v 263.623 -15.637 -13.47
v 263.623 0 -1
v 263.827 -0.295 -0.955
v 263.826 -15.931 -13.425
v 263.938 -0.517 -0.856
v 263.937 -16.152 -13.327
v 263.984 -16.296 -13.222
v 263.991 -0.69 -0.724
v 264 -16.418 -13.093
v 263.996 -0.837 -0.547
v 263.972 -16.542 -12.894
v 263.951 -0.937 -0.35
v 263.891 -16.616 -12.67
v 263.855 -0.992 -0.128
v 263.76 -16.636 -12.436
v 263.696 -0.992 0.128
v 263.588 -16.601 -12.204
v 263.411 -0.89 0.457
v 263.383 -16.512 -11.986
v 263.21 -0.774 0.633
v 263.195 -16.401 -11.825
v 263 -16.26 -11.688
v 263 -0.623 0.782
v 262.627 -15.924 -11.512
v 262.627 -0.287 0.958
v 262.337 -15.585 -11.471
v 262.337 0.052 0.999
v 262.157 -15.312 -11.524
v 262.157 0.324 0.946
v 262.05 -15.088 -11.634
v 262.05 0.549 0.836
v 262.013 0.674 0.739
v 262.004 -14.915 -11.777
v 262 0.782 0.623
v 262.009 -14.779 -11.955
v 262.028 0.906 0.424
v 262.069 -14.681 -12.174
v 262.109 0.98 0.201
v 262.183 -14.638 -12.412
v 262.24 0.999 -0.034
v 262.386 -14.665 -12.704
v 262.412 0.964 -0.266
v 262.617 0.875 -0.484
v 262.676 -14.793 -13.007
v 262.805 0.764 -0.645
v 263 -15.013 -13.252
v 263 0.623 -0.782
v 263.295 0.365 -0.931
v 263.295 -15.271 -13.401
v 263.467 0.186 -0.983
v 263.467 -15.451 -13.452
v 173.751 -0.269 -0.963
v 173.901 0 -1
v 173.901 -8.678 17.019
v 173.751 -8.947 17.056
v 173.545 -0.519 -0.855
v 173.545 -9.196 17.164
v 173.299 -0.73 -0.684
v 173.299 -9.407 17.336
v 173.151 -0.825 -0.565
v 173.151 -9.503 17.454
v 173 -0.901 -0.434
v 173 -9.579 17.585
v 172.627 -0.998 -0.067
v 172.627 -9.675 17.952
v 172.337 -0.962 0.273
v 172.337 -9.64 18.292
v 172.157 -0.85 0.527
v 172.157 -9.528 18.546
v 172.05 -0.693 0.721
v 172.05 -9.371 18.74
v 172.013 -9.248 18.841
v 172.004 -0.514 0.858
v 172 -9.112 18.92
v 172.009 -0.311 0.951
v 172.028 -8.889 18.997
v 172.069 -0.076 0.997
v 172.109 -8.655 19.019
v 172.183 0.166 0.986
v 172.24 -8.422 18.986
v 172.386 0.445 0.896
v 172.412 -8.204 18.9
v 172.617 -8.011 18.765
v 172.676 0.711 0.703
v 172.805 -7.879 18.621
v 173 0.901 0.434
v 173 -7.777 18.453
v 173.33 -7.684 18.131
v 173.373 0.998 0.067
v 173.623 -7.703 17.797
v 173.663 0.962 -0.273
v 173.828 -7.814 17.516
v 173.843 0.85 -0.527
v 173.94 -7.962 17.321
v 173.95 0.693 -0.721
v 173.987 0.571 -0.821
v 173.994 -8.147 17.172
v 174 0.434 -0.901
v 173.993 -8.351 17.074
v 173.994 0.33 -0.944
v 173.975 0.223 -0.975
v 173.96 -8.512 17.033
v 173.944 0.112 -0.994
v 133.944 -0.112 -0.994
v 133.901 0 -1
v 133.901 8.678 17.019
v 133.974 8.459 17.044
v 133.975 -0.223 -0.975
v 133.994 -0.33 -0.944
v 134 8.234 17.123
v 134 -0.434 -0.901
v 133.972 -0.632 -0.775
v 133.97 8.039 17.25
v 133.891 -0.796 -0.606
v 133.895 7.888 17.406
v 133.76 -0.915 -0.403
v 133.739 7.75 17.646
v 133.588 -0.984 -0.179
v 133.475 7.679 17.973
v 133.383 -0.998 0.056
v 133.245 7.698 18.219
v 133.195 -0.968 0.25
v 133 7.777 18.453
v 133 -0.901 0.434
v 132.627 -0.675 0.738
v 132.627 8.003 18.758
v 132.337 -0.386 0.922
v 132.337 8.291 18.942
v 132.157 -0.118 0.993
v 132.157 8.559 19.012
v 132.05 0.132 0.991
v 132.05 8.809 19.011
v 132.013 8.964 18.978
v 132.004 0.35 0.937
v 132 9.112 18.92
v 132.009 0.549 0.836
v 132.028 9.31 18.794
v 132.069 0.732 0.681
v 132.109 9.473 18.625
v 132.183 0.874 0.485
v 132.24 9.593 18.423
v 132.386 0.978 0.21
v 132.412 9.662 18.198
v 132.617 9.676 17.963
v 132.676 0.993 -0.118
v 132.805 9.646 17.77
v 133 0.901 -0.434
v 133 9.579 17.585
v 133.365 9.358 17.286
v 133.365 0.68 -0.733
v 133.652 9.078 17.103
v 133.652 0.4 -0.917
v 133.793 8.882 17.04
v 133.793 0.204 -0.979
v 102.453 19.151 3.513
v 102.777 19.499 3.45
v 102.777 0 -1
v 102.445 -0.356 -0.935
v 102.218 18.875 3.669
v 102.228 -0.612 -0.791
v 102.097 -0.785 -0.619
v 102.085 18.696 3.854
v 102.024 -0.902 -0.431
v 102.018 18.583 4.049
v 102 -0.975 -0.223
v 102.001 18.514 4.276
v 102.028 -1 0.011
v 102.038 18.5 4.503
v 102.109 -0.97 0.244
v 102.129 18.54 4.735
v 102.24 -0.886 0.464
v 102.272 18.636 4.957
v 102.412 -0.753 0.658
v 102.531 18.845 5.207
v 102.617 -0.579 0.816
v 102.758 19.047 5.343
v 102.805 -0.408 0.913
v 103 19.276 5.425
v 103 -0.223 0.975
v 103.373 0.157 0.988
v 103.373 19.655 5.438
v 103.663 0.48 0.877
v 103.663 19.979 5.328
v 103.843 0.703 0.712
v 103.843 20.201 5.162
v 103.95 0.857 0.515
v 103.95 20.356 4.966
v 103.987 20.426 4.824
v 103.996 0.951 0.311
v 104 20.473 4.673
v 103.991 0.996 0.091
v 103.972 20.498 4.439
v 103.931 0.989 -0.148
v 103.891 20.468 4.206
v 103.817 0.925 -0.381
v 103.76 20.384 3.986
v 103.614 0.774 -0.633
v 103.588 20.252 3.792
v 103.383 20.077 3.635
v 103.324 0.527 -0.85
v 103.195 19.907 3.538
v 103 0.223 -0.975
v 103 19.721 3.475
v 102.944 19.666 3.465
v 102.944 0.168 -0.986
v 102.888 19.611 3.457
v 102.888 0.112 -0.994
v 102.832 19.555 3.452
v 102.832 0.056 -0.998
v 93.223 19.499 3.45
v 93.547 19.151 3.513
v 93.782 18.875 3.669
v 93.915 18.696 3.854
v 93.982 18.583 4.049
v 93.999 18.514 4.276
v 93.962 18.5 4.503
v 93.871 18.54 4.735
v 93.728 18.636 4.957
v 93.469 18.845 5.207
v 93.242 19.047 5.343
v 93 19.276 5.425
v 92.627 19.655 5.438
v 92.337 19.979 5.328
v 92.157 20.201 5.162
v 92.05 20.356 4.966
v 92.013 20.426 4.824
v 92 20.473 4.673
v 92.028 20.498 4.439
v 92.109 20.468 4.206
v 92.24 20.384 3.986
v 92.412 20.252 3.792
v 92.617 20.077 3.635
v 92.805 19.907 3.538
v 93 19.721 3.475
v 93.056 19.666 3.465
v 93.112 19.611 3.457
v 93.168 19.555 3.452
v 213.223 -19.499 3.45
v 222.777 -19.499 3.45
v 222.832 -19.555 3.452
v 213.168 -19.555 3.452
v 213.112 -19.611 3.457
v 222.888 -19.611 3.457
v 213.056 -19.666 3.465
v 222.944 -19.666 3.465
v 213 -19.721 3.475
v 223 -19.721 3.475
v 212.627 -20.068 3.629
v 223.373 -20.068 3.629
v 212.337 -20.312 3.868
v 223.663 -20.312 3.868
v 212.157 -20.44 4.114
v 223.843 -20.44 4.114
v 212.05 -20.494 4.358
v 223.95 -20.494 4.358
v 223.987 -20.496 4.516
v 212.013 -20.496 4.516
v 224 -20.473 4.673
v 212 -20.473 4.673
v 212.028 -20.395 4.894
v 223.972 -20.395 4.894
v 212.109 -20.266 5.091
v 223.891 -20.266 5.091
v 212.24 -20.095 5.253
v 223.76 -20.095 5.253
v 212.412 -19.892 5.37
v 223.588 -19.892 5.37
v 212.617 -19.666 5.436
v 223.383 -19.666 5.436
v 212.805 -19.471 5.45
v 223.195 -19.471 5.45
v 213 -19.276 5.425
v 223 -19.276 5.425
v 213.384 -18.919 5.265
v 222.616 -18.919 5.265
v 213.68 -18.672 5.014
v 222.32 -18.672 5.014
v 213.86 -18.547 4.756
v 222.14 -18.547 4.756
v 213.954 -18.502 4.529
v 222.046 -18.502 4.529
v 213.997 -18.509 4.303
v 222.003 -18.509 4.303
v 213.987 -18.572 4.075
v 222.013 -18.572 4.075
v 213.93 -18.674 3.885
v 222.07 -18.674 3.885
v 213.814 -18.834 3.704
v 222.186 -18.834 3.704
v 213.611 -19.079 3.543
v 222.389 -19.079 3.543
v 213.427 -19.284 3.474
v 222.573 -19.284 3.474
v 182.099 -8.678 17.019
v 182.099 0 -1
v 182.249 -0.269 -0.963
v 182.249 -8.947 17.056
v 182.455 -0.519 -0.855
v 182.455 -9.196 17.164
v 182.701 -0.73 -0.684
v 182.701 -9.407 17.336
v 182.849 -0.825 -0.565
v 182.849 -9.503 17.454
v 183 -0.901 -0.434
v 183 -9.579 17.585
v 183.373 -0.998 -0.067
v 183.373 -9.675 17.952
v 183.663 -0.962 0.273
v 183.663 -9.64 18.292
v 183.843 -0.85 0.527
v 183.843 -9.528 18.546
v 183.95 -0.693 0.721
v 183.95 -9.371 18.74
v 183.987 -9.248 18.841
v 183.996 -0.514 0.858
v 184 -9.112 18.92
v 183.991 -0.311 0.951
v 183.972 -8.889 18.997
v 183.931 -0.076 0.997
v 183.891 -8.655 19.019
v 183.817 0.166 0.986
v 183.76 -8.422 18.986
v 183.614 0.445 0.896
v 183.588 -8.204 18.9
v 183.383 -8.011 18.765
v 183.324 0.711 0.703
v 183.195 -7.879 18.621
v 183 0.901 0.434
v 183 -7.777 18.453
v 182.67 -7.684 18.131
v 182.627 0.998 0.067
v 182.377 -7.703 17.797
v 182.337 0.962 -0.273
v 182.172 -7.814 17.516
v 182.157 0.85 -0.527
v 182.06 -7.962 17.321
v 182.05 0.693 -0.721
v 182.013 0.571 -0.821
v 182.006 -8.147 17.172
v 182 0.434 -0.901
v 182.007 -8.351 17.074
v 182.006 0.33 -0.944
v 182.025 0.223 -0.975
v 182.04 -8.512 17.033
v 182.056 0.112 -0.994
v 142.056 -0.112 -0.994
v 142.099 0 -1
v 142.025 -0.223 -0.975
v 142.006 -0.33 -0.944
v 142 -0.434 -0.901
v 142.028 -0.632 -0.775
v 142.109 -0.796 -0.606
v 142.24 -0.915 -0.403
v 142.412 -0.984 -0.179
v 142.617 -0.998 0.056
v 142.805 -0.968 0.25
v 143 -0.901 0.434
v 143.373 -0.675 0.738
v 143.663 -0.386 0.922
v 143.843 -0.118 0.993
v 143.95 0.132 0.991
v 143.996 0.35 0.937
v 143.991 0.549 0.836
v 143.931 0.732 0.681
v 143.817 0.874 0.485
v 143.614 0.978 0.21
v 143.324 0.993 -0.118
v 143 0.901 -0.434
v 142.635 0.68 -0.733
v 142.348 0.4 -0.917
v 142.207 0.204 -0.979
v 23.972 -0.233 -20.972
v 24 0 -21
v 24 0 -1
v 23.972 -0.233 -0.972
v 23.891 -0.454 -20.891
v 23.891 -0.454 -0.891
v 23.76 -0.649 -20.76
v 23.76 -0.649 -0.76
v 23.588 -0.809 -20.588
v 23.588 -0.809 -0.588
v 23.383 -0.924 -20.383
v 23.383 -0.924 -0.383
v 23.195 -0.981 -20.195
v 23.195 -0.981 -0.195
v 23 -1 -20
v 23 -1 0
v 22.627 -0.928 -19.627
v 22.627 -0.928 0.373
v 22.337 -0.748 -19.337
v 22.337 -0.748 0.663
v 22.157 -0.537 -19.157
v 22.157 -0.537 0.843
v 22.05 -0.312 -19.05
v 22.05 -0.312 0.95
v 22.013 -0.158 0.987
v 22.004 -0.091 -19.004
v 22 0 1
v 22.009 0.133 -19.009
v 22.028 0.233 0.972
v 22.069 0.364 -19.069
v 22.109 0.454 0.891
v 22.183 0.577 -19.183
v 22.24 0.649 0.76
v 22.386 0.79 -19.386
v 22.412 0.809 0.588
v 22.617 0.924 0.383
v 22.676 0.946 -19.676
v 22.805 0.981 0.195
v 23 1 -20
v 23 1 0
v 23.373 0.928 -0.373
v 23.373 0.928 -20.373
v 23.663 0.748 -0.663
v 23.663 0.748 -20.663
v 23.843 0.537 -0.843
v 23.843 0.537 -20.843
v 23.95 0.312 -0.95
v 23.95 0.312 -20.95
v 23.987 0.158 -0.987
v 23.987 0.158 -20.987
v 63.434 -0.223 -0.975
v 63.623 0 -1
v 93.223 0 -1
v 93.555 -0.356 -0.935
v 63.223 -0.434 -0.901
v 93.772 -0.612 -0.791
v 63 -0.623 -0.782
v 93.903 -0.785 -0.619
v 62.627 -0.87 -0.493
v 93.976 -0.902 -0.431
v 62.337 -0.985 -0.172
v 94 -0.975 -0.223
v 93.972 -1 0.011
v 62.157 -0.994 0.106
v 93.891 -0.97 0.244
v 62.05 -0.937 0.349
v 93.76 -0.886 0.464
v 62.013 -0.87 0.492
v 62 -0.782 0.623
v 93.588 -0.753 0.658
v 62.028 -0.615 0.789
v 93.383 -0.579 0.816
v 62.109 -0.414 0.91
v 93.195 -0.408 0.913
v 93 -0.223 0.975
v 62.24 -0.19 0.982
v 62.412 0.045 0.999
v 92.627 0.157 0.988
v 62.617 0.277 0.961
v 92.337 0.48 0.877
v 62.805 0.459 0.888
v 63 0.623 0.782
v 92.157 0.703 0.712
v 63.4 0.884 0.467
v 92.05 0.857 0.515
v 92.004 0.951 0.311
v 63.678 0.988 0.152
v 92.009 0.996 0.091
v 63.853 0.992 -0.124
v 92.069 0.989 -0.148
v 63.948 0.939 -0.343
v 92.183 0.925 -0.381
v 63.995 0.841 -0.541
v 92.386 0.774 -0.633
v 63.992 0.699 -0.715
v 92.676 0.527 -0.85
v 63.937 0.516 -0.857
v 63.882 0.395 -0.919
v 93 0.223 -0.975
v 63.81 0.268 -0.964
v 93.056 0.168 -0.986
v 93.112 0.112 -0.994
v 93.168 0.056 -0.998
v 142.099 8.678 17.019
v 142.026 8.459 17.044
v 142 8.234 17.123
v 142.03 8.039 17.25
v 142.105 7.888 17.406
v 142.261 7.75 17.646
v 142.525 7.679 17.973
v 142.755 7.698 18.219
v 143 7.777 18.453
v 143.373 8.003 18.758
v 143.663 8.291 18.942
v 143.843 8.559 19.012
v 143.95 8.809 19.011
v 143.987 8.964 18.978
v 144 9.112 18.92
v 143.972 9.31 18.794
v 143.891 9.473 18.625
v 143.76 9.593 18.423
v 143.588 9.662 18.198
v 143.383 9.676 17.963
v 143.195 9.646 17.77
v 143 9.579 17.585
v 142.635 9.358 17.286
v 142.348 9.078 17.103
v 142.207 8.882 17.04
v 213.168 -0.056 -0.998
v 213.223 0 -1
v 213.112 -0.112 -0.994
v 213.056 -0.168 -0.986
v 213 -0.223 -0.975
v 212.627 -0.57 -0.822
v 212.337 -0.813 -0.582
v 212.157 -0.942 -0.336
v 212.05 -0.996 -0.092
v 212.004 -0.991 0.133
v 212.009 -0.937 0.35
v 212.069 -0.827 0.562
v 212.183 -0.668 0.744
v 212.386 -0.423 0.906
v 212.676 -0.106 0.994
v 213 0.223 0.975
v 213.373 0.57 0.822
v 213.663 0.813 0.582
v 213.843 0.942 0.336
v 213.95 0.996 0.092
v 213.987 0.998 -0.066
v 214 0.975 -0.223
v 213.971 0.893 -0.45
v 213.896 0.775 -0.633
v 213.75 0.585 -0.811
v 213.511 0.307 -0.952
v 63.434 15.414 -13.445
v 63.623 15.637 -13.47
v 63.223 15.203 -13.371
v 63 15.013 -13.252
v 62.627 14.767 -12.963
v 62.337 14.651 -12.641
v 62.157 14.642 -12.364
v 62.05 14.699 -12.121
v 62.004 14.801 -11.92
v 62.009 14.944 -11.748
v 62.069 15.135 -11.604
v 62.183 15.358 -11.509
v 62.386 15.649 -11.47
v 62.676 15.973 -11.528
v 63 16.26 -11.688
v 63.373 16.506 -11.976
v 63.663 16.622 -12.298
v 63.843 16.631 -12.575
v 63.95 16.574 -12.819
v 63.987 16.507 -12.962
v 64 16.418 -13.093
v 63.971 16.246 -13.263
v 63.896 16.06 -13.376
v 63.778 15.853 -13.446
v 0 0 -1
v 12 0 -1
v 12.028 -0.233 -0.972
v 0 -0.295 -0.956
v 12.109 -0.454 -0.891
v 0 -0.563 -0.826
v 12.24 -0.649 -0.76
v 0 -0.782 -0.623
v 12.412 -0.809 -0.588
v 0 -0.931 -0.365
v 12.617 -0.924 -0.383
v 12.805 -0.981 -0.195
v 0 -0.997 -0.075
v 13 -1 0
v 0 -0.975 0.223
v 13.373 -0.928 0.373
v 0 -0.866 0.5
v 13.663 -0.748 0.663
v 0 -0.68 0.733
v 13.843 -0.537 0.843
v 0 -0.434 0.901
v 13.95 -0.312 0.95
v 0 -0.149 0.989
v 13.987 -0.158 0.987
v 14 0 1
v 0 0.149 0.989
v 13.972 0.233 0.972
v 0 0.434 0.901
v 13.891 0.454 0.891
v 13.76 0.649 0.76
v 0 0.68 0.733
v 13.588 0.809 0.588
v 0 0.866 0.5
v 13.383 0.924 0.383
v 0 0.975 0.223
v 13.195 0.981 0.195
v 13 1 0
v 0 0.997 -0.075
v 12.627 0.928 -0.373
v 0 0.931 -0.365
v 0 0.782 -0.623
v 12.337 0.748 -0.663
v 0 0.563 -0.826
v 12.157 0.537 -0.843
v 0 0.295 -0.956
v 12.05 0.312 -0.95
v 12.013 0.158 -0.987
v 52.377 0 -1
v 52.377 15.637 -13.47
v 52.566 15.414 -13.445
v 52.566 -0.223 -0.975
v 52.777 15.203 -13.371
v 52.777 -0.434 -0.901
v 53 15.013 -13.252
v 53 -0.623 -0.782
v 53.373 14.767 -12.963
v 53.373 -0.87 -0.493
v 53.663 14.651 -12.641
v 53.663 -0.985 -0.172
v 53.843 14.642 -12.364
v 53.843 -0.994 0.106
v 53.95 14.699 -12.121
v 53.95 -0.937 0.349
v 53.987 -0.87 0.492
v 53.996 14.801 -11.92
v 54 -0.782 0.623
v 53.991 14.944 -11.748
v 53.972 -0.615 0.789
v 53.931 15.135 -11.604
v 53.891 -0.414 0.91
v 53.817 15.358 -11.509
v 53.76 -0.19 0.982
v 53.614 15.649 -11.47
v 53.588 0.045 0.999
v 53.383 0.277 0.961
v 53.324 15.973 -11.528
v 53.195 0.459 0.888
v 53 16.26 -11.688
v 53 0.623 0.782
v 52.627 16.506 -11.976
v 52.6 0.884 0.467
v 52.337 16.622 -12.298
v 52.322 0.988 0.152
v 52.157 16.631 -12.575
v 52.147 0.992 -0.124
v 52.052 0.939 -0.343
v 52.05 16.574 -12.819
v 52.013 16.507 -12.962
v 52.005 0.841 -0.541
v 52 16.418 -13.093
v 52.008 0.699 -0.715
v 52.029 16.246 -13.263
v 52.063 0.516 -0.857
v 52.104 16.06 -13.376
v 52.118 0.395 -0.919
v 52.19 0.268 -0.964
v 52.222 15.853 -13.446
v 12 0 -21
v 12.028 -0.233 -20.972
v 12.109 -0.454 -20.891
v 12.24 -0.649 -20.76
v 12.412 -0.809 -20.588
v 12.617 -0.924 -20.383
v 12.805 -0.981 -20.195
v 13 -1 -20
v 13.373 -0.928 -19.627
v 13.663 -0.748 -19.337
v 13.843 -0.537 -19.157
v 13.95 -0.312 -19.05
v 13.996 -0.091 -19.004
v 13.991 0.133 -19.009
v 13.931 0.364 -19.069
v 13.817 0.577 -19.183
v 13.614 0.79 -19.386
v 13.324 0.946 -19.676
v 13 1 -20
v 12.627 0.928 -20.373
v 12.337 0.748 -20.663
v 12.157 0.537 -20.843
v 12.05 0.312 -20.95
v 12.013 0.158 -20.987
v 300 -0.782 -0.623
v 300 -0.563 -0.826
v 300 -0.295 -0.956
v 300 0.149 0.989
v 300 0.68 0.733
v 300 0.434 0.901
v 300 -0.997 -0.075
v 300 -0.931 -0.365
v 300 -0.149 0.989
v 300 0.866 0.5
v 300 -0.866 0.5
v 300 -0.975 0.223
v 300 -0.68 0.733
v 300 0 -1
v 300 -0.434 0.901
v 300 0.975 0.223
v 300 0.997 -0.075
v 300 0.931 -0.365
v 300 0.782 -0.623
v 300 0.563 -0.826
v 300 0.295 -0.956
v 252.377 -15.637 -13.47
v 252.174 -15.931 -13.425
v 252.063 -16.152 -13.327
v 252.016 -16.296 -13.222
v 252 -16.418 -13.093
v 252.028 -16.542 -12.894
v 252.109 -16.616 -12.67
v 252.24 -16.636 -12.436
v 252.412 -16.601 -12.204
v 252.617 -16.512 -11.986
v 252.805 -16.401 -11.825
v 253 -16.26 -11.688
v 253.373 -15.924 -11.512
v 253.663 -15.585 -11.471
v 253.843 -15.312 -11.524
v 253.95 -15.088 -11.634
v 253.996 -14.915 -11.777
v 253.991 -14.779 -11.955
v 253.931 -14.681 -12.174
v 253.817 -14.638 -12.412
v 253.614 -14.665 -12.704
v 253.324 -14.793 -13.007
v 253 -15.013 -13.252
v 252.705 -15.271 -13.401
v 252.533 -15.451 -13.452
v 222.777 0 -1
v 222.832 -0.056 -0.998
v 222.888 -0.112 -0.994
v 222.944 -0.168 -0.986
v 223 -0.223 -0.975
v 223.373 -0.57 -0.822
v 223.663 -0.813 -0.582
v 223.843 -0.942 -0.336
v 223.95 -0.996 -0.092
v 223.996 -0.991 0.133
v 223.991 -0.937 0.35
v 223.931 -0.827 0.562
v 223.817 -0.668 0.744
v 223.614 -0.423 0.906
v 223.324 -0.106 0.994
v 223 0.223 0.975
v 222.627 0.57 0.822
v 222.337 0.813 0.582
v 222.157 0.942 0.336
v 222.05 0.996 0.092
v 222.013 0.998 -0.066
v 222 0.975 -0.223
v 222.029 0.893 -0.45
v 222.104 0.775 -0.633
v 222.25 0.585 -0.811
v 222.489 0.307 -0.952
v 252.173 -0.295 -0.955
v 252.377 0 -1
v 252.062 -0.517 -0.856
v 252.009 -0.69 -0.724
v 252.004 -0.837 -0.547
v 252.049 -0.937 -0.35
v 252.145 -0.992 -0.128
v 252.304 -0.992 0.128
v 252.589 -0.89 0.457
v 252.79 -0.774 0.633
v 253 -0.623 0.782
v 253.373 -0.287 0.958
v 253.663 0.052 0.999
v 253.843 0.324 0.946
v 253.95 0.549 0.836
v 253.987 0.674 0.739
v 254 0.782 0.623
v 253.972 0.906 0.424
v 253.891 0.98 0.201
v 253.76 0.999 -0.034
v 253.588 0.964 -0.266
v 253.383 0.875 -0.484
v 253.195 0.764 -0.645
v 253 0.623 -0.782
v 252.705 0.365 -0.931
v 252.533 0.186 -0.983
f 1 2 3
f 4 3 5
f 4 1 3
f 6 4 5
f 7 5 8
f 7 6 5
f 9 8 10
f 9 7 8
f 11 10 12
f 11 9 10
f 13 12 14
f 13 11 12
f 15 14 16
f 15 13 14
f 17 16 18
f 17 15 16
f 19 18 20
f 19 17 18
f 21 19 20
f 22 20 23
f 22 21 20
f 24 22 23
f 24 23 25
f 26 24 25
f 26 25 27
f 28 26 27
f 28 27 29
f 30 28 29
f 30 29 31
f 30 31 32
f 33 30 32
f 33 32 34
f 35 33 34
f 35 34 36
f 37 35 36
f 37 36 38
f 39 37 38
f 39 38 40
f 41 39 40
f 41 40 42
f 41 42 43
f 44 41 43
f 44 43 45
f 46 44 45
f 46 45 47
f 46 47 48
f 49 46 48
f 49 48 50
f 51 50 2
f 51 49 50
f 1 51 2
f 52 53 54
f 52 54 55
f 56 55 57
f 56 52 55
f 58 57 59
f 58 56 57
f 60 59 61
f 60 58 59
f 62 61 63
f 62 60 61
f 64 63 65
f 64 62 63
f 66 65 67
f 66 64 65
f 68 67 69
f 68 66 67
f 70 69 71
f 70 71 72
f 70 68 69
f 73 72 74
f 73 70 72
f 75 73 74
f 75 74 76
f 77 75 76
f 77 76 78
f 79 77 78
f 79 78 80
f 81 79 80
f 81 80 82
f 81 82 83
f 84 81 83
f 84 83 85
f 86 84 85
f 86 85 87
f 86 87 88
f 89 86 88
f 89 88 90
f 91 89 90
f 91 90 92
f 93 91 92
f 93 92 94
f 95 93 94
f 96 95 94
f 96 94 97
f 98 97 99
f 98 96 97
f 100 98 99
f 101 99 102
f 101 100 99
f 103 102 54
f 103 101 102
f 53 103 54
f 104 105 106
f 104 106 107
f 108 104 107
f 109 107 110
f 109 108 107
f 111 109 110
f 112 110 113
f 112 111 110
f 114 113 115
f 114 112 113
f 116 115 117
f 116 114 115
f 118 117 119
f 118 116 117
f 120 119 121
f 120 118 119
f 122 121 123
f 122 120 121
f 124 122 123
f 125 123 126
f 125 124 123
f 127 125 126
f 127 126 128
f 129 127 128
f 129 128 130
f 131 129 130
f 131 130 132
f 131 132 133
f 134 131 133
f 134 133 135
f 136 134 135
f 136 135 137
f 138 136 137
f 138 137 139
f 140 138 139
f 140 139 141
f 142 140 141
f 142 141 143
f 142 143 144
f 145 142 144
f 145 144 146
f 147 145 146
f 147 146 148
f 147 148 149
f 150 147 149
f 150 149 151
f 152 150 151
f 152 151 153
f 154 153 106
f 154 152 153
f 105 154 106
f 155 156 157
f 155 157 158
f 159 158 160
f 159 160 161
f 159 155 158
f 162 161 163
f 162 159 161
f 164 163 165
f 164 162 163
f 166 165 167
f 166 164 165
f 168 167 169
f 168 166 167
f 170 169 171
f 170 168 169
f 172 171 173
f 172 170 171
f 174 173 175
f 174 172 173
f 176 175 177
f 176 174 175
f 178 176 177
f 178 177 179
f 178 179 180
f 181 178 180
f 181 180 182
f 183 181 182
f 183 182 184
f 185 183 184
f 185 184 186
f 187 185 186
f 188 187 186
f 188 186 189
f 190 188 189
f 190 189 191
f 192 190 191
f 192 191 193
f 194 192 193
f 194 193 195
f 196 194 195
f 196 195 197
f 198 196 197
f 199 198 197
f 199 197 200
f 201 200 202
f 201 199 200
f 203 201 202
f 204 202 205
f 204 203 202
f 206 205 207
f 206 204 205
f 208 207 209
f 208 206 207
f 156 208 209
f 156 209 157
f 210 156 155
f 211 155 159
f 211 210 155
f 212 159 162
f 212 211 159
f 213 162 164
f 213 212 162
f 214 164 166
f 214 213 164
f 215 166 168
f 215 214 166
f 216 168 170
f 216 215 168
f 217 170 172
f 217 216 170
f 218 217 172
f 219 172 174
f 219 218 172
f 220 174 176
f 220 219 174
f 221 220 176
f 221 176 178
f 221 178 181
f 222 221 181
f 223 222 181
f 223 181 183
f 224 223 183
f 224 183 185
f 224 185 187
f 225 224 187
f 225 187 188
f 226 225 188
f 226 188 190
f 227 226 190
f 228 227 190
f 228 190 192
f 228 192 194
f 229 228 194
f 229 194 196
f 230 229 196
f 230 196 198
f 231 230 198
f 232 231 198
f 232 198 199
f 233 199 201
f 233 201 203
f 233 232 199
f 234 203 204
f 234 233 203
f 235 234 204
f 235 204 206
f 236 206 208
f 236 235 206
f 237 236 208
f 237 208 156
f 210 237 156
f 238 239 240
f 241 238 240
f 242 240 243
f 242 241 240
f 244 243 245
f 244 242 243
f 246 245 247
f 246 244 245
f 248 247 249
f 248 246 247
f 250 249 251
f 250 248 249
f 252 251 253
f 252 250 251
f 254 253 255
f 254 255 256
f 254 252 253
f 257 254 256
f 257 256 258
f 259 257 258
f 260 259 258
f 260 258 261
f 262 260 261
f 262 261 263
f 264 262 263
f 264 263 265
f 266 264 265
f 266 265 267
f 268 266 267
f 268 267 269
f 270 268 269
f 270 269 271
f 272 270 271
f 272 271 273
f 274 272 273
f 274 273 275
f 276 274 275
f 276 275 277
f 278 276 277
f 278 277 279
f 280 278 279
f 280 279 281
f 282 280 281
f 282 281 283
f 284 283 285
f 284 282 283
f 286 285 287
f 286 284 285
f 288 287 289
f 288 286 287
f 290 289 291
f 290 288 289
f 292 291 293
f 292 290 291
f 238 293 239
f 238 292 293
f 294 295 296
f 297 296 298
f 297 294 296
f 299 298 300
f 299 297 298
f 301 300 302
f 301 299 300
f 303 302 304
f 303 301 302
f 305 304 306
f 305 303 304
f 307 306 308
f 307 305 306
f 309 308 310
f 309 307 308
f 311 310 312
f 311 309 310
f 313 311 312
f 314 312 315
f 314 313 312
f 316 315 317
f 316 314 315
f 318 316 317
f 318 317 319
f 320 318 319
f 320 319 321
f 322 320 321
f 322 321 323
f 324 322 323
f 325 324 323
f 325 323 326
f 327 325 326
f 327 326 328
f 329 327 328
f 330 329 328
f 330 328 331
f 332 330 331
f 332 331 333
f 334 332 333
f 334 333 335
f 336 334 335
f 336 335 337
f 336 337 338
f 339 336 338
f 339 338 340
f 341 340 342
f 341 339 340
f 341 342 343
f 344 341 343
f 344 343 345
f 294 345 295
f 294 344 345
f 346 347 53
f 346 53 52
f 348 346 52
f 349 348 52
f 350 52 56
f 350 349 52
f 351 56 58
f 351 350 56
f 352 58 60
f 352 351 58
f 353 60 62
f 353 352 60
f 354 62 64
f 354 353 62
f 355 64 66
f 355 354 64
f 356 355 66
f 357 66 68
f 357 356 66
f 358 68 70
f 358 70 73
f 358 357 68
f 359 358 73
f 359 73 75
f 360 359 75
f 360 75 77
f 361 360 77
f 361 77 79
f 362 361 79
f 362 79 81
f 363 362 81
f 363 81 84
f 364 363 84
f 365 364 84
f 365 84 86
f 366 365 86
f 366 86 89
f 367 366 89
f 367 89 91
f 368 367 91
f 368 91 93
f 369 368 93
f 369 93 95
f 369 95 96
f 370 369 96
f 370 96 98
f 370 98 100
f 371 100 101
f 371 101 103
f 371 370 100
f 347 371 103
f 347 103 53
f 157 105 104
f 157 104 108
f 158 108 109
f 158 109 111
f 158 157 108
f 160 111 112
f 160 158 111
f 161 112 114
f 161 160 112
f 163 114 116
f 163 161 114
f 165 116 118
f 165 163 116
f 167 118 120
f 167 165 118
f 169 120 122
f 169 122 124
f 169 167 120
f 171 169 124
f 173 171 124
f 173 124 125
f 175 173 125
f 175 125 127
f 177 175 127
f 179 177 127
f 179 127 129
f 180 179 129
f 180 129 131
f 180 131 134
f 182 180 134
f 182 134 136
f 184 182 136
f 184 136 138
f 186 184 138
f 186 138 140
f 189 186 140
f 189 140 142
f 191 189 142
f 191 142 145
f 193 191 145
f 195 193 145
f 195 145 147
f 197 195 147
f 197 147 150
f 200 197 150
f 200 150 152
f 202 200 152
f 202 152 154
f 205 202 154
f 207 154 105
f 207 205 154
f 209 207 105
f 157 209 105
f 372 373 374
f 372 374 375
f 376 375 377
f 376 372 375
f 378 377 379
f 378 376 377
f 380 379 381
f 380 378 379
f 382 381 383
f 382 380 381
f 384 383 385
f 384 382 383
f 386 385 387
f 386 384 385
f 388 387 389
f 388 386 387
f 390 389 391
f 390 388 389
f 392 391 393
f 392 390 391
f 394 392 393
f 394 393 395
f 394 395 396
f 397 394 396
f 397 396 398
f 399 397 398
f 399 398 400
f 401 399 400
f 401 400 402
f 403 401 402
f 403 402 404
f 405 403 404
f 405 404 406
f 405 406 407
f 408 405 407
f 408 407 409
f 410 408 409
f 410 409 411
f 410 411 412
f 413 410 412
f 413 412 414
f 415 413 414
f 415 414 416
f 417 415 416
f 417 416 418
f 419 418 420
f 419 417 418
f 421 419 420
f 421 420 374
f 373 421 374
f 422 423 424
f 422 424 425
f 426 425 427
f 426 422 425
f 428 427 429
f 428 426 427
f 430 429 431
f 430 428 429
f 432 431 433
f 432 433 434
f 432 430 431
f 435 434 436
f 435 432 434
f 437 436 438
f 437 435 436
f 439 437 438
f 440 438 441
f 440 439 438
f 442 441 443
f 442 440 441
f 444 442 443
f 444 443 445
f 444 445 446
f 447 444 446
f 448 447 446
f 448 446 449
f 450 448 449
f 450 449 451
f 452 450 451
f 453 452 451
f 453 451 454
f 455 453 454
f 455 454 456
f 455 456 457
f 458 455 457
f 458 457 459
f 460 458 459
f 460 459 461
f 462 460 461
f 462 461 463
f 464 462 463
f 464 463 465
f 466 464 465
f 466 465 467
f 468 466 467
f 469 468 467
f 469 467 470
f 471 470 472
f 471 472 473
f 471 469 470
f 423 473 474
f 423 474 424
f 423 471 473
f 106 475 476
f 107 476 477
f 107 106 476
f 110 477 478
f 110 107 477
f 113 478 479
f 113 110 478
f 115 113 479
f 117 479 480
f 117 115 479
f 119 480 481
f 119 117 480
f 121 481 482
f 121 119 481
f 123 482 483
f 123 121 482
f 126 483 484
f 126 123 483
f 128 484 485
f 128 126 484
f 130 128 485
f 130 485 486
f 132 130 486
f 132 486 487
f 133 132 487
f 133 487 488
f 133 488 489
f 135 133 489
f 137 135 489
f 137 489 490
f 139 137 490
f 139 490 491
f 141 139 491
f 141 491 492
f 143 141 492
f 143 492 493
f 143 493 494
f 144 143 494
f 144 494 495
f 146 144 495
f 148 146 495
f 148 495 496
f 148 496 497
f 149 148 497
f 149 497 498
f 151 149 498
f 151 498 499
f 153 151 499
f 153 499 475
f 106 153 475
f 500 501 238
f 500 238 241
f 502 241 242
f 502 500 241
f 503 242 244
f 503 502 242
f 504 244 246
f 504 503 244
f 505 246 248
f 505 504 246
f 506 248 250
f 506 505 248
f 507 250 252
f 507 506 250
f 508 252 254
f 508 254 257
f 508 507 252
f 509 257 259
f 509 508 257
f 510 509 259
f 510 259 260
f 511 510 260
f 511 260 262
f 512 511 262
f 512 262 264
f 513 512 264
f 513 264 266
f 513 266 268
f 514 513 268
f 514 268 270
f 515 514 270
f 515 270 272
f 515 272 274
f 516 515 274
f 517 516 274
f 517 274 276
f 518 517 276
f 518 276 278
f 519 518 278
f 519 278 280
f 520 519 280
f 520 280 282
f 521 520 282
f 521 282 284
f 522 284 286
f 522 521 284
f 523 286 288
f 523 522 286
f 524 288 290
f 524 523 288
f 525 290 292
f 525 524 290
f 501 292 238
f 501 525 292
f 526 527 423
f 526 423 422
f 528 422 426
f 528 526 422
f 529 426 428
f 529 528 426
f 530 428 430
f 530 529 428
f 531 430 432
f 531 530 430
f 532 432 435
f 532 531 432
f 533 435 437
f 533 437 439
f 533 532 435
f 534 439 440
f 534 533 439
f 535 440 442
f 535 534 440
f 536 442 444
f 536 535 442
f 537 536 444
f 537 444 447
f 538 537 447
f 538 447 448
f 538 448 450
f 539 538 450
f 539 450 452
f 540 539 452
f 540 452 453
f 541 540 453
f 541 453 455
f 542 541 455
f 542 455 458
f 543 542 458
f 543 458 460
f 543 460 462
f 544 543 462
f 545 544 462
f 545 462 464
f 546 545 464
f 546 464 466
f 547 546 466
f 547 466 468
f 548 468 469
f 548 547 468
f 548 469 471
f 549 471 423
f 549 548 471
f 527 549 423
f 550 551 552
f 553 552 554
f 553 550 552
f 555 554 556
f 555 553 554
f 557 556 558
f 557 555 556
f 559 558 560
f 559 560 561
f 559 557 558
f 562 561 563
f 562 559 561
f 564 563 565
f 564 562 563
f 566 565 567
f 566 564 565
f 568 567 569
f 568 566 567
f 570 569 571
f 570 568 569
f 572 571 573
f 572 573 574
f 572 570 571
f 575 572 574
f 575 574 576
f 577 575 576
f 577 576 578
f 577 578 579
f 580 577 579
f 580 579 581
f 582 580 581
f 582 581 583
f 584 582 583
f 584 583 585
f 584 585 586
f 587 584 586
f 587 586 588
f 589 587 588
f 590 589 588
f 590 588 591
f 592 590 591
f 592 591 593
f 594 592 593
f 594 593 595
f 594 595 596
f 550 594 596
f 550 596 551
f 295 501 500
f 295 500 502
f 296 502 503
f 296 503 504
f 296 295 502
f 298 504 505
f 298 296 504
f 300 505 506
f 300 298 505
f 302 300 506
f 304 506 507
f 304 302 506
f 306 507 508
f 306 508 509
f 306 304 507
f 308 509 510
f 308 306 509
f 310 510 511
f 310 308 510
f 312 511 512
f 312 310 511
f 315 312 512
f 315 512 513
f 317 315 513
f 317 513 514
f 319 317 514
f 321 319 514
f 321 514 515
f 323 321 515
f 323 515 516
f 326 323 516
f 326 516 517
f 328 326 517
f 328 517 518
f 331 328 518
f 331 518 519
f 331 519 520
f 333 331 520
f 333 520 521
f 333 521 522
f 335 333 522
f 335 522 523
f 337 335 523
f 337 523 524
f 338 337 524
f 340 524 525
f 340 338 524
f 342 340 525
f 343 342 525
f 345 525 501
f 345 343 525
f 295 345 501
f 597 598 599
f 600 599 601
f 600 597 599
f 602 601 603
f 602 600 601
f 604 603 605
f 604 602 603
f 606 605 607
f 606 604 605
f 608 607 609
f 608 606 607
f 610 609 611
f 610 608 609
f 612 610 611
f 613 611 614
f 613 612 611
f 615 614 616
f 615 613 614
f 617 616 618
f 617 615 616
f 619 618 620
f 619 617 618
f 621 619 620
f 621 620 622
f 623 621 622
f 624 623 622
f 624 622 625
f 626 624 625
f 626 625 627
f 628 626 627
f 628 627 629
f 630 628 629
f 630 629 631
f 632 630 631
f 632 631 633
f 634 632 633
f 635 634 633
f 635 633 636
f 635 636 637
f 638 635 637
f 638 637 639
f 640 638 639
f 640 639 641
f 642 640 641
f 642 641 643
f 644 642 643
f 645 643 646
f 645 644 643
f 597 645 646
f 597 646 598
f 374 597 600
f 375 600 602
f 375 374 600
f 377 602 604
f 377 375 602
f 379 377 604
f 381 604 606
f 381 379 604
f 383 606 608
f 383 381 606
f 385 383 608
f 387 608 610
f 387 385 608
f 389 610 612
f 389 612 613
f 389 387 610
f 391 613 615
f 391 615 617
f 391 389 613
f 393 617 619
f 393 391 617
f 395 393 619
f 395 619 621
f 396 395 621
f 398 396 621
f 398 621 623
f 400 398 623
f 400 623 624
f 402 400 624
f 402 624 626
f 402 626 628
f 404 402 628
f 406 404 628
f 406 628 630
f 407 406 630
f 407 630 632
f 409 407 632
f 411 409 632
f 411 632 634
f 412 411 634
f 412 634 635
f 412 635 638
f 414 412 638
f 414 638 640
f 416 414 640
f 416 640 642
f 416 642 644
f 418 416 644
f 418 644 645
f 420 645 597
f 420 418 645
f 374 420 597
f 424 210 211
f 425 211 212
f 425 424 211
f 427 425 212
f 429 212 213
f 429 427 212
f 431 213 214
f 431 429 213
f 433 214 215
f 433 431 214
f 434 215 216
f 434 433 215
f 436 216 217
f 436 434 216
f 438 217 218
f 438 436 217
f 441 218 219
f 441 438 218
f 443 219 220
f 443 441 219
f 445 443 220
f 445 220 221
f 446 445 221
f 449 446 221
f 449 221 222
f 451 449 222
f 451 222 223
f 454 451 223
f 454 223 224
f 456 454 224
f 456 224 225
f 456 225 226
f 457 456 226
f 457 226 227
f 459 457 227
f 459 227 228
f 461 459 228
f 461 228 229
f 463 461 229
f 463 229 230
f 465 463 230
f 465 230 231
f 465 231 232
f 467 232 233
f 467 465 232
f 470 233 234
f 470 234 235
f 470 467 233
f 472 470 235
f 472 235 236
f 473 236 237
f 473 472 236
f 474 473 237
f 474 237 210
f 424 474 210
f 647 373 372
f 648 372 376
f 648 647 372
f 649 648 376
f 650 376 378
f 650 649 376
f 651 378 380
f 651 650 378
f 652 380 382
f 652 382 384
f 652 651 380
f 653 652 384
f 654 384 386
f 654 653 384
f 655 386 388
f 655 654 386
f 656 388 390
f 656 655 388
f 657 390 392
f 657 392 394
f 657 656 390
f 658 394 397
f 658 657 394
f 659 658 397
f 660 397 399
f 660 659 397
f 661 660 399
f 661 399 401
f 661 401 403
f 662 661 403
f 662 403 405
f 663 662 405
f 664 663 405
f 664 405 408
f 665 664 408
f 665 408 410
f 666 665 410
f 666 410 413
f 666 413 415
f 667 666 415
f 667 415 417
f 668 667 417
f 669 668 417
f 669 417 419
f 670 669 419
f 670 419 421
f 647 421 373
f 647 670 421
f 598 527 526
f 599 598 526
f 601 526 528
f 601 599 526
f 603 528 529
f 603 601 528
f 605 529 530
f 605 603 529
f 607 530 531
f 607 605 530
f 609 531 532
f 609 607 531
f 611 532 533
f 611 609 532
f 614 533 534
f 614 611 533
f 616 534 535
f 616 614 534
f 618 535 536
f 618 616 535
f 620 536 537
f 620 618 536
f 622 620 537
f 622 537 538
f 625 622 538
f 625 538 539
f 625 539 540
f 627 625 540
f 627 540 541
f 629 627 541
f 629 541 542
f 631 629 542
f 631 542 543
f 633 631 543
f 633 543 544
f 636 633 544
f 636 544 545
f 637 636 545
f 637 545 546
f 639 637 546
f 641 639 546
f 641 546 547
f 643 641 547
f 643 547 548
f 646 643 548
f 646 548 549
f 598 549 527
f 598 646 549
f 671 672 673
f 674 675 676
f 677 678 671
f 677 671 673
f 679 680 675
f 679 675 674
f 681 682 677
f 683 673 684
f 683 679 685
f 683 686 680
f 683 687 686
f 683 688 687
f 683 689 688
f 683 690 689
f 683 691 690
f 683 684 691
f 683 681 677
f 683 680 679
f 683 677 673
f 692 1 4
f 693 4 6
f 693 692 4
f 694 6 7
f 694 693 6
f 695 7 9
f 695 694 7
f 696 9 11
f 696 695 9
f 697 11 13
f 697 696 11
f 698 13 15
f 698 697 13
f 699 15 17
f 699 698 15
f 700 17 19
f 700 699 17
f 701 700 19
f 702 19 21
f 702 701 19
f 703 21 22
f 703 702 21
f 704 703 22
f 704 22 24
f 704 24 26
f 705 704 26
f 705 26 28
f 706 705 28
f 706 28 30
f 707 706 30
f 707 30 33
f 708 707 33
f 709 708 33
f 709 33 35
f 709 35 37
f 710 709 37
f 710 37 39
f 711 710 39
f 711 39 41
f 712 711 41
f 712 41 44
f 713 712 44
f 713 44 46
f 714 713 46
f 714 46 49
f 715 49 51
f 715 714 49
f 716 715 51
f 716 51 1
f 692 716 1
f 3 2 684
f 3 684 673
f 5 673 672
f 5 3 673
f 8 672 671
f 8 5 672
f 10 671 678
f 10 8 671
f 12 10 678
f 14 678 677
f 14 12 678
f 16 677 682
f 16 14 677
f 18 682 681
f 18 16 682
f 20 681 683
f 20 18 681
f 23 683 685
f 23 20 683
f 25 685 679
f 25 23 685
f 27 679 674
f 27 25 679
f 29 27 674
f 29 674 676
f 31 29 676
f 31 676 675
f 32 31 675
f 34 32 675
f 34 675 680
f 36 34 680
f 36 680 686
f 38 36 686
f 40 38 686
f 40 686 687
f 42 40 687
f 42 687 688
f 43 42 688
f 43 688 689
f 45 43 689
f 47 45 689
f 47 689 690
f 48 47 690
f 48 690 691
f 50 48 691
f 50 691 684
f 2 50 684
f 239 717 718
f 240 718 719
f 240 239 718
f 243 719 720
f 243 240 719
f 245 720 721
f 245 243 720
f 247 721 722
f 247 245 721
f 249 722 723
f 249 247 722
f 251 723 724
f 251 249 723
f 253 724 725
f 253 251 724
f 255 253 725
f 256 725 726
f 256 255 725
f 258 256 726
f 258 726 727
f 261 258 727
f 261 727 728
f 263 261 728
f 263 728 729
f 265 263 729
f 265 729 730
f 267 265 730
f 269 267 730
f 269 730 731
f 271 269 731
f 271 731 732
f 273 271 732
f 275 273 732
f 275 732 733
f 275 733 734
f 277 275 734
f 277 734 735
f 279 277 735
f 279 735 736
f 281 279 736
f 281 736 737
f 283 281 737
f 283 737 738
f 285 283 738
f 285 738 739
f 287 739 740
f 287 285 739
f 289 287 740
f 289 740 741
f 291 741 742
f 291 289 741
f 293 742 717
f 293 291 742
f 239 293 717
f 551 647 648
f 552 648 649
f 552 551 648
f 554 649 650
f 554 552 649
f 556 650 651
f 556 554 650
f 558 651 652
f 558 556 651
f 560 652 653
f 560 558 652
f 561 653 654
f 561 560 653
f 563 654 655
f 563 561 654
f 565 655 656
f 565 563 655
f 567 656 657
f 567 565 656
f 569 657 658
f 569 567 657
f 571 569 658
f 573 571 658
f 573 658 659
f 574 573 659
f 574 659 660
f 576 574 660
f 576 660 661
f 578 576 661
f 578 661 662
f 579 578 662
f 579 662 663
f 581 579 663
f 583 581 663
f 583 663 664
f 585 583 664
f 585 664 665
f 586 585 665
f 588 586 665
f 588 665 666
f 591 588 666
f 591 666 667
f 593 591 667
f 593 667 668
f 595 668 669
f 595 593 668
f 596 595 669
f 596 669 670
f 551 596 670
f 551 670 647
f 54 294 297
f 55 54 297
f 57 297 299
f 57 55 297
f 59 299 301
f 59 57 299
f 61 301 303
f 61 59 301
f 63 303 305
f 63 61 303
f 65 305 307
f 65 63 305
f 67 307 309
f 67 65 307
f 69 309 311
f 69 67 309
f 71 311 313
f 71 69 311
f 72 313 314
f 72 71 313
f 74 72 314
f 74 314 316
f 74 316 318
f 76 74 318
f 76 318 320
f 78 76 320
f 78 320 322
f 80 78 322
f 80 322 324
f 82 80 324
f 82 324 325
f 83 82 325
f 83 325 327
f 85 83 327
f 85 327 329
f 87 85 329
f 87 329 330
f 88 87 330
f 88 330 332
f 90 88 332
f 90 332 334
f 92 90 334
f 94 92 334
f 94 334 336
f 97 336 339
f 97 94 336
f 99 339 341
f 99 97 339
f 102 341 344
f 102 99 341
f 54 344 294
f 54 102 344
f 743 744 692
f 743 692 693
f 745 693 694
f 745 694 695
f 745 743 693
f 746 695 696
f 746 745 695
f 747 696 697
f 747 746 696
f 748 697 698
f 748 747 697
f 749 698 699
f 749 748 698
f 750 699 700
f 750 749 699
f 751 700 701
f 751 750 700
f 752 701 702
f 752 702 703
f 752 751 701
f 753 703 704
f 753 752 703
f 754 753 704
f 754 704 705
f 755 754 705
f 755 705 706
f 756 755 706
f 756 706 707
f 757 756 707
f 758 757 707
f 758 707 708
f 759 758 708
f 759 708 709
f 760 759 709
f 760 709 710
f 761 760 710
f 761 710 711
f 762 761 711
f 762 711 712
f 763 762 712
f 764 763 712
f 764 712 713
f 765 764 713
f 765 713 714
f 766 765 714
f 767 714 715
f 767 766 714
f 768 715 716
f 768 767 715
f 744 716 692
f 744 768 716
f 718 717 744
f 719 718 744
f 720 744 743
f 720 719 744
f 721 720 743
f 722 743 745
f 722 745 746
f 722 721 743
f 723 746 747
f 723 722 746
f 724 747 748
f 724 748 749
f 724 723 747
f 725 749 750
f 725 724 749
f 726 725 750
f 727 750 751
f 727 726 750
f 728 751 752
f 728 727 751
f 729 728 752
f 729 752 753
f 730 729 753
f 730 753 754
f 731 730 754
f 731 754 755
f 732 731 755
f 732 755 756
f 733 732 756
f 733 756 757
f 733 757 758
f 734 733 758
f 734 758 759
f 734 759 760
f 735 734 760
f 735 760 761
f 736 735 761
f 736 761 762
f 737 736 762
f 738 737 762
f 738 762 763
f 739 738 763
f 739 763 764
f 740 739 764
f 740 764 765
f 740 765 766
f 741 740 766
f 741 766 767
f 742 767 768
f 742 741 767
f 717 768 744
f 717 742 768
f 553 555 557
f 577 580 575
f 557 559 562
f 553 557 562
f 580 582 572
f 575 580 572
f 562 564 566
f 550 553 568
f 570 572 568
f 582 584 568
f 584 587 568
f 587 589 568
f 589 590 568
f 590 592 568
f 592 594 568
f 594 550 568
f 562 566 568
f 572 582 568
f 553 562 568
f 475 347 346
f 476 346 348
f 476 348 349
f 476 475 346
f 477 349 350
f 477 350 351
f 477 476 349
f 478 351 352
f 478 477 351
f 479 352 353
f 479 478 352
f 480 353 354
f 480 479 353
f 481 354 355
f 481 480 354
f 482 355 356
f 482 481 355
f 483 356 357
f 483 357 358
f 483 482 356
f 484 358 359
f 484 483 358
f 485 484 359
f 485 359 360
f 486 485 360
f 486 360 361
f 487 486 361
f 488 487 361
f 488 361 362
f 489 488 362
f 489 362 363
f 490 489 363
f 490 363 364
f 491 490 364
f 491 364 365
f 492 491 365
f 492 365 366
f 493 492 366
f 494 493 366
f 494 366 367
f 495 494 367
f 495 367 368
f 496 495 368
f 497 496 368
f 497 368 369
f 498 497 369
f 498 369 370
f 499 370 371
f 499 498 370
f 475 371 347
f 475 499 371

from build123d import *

# Parameters (mm, degrees)
SKETCH5_R = 1


with BuildPart() as part:
    # Sweep1: sweep along a curve in space
    with BuildLine() as sweep1_path:
        Line((13, 0, 0), (0, 0, 0))
        Line((13, 0, -20), (13, 0, 0))
        Line((23, 0, -20), (13, 0, -20))
        Line((23, 0, 0), (23, 0, -20))
        Line((53, 0, 0), (23, 0, 0))
        Line((53, 0, 0), (53, 15.636629649, -12.469796037))
        Line((53, 15.636629649, -12.469796037), (63, 15.636629649, -12.469796037))
        Line((63, 15.636629649, -12.469796037), (63, 0, 0))
        Line((63, 0, 0), (93, 0, 0))
        Line((93, 0, 0), (93, 19.498558244, 4.450418679))
        Line((93, 19.498558244, 4.450418679), (103, 19.498558244, 4.450418679))
        Line((103, 19.498558244, 4.450418679), (103, 0, 0))
        Line((103, 0, 0), (133, 0, 0))
        Line((133, 0, 0), (133, 8.677674782, 18.019377358))
        Line((133, 8.677674782, 18.019377358), (143, 8.677674782, 18.019377358))
        Line((143, 8.677674782, 18.019377358), (143, 0, 0))
        Line((143, 0, 0), (173, 0, 0))
        Line((173, 0, 0), (173, -8.677674782, 18.019377358))
        Line((173, -8.677674782, 18.019377358), (183, -8.677674782, 18.019377358))
        Line((183, -8.677674782, 18.019377358), (183, 0, 0))
        Line((183, 0, 0), (213, 0, 0))
        Line((213, 0, 0), (213, -19.498558244, 4.450418679))
        Line((213, -19.498558244, 4.450418679), (223, -19.498558244, 4.450418679))
        Line((223, -19.498558244, 4.450418679), (223, 0, 0))
        Line((223, 0, 0), (253, 0, 0))
        Line((253, 0, 0), (253, -15.636629649, -12.469796037))
        Line((253, -15.636629649, -12.469796037), (263, -15.636629649, -12.469796037))
        Line((263, -15.636629649, -12.469796037), (263, 0, 0))
        Line((263, 0, 0), (300, 0, 0))
    # Sketch5 → Sweep1 (sweep)
    with BuildSketch(Plane(origin=(0, 0, 0), x_dir=(0, 0, -1), z_dir=(1, 0, 0))):
        Circle(SKETCH5_R)
    sweep(path=sweep1_path.line, transition=Transition.RIGHT)


solid = part.part
